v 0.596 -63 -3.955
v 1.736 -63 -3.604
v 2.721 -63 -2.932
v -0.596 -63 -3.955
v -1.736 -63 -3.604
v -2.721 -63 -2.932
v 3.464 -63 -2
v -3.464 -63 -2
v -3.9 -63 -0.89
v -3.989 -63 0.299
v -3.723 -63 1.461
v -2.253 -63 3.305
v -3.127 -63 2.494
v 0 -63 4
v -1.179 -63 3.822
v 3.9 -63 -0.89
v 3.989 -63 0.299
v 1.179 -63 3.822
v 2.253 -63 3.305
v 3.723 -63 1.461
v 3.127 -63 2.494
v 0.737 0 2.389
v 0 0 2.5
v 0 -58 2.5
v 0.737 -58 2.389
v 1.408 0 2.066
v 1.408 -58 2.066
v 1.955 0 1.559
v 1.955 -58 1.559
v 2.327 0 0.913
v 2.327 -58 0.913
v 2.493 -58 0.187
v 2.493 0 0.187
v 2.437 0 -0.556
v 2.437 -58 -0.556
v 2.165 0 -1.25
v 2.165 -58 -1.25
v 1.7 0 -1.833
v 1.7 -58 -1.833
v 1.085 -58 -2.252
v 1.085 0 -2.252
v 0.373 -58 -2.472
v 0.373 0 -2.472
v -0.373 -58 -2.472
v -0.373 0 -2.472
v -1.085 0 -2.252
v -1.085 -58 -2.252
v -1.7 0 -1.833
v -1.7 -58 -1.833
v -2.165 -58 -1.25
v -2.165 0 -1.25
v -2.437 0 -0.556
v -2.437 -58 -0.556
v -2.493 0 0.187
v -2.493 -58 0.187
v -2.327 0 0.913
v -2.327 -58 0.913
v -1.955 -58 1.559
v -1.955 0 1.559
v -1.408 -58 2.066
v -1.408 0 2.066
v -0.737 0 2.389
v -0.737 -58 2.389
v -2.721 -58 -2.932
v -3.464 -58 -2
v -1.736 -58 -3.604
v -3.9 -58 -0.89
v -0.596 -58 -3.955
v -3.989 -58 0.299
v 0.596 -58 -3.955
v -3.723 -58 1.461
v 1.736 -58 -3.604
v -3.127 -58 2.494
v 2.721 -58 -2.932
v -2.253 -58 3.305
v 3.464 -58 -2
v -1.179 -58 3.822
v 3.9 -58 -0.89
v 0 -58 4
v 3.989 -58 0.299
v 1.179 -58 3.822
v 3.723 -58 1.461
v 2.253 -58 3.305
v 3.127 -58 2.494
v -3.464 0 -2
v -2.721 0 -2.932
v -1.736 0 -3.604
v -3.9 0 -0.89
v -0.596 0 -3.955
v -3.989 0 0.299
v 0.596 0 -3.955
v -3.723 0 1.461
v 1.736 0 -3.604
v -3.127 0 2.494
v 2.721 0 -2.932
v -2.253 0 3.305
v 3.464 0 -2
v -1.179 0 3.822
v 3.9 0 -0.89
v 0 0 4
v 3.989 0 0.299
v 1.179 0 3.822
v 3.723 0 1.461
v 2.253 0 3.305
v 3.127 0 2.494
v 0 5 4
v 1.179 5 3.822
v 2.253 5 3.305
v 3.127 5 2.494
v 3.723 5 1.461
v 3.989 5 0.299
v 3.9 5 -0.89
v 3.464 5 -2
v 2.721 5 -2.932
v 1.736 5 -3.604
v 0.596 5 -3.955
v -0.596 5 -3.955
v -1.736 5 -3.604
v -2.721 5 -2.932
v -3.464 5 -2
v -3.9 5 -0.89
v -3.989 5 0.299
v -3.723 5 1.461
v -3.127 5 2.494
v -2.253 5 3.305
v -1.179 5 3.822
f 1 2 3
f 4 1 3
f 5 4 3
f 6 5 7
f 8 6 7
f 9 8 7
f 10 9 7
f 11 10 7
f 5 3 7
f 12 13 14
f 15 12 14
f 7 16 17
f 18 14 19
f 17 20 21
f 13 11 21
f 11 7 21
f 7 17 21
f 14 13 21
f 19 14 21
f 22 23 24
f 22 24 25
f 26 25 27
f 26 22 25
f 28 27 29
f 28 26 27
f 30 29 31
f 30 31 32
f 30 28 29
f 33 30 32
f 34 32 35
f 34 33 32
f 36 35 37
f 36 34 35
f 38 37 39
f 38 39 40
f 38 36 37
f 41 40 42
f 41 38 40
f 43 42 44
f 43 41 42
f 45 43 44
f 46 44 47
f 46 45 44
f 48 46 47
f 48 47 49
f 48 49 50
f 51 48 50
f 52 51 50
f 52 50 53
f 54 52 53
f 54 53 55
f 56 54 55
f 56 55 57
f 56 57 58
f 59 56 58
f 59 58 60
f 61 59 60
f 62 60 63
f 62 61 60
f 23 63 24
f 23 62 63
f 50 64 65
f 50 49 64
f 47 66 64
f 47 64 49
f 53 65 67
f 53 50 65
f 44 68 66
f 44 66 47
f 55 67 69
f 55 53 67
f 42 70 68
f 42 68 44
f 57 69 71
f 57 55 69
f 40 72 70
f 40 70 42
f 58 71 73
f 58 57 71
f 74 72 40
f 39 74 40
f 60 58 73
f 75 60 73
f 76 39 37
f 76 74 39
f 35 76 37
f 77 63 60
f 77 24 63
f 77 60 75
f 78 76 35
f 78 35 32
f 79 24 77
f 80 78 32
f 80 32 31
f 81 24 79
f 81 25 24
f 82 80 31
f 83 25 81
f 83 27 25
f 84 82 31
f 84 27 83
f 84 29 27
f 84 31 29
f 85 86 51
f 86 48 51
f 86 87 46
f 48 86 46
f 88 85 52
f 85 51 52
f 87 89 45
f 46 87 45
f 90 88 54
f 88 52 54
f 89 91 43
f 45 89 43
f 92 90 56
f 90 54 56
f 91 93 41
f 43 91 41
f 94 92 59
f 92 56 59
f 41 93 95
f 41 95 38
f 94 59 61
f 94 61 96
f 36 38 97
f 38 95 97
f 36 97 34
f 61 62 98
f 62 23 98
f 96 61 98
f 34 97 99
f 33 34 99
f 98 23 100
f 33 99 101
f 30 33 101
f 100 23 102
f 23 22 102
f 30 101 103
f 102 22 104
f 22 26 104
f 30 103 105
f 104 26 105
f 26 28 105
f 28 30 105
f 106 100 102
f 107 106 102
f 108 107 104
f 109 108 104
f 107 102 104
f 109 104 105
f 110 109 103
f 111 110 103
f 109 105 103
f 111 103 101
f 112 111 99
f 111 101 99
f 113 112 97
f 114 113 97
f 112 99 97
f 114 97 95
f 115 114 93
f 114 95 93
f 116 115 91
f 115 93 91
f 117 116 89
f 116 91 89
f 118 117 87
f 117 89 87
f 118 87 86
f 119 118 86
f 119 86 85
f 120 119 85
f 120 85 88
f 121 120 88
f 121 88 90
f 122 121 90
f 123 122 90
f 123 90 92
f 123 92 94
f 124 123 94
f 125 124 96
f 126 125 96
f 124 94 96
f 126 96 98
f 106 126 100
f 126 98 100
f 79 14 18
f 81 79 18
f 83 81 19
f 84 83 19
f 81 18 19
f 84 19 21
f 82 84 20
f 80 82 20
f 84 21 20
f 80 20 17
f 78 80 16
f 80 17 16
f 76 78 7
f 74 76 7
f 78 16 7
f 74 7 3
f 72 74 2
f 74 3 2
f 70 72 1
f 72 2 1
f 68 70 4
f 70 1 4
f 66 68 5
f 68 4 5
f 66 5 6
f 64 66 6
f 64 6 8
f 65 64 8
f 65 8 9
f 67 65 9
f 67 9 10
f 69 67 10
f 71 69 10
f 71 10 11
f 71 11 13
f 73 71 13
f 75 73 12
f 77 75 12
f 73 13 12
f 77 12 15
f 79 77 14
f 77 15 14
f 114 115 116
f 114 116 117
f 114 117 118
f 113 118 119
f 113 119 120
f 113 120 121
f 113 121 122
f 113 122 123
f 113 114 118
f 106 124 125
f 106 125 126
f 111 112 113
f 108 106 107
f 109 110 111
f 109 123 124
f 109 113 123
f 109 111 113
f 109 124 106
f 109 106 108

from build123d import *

# Parameters (mm, degrees)
SKETCH1_R           = 2.5
BOSS_EXTRUDE1_DEPTH = 58
SKETCH2_R           = 4
BOSS_EXTRUDE2_DEPTH = 5
BOSS_EXTRUDE3_START = -63
SKETCH3_R           = 4
BOSS_EXTRUDE3_DEPTH = 5


with BuildPart() as part:
    # Sketch1 → Boss-Extrude1 (new body)
    with BuildSketch(Plane(origin=(0, 0, 0), x_dir=(1, 0, 0), z_dir=(0, 1, 0))):
        with Locations(Location((0, 0, 0), (0, 0, 270))):
            Circle(SKETCH1_R)
    extrude(amount=-BOSS_EXTRUDE1_DEPTH)

    # Sketch2 → Boss-Extrude2 (add)
    with BuildSketch(Plane(origin=(0, 0, 0), x_dir=(1, 0, 0), z_dir=(0, 1, 0))):
        with Locations(Location((0, 0, 0), (0, 0, 270))):
            Circle(SKETCH2_R)
    extrude(amount=BOSS_EXTRUDE2_DEPTH)

    # Sketch3 → Boss-Extrude3 (add)
    with BuildSketch(Plane(origin=(0, 0, 0), x_dir=(1, 0, 0), z_dir=(0, 1, 0)).offset(BOSS_EXTRUDE3_START)):
        with Locations(Location((0, 0, 0), (0, 0, 270))):
            Circle(SKETCH3_R)
    extrude(amount=BOSS_EXTRUDE3_DEPTH)


solid = part.part
